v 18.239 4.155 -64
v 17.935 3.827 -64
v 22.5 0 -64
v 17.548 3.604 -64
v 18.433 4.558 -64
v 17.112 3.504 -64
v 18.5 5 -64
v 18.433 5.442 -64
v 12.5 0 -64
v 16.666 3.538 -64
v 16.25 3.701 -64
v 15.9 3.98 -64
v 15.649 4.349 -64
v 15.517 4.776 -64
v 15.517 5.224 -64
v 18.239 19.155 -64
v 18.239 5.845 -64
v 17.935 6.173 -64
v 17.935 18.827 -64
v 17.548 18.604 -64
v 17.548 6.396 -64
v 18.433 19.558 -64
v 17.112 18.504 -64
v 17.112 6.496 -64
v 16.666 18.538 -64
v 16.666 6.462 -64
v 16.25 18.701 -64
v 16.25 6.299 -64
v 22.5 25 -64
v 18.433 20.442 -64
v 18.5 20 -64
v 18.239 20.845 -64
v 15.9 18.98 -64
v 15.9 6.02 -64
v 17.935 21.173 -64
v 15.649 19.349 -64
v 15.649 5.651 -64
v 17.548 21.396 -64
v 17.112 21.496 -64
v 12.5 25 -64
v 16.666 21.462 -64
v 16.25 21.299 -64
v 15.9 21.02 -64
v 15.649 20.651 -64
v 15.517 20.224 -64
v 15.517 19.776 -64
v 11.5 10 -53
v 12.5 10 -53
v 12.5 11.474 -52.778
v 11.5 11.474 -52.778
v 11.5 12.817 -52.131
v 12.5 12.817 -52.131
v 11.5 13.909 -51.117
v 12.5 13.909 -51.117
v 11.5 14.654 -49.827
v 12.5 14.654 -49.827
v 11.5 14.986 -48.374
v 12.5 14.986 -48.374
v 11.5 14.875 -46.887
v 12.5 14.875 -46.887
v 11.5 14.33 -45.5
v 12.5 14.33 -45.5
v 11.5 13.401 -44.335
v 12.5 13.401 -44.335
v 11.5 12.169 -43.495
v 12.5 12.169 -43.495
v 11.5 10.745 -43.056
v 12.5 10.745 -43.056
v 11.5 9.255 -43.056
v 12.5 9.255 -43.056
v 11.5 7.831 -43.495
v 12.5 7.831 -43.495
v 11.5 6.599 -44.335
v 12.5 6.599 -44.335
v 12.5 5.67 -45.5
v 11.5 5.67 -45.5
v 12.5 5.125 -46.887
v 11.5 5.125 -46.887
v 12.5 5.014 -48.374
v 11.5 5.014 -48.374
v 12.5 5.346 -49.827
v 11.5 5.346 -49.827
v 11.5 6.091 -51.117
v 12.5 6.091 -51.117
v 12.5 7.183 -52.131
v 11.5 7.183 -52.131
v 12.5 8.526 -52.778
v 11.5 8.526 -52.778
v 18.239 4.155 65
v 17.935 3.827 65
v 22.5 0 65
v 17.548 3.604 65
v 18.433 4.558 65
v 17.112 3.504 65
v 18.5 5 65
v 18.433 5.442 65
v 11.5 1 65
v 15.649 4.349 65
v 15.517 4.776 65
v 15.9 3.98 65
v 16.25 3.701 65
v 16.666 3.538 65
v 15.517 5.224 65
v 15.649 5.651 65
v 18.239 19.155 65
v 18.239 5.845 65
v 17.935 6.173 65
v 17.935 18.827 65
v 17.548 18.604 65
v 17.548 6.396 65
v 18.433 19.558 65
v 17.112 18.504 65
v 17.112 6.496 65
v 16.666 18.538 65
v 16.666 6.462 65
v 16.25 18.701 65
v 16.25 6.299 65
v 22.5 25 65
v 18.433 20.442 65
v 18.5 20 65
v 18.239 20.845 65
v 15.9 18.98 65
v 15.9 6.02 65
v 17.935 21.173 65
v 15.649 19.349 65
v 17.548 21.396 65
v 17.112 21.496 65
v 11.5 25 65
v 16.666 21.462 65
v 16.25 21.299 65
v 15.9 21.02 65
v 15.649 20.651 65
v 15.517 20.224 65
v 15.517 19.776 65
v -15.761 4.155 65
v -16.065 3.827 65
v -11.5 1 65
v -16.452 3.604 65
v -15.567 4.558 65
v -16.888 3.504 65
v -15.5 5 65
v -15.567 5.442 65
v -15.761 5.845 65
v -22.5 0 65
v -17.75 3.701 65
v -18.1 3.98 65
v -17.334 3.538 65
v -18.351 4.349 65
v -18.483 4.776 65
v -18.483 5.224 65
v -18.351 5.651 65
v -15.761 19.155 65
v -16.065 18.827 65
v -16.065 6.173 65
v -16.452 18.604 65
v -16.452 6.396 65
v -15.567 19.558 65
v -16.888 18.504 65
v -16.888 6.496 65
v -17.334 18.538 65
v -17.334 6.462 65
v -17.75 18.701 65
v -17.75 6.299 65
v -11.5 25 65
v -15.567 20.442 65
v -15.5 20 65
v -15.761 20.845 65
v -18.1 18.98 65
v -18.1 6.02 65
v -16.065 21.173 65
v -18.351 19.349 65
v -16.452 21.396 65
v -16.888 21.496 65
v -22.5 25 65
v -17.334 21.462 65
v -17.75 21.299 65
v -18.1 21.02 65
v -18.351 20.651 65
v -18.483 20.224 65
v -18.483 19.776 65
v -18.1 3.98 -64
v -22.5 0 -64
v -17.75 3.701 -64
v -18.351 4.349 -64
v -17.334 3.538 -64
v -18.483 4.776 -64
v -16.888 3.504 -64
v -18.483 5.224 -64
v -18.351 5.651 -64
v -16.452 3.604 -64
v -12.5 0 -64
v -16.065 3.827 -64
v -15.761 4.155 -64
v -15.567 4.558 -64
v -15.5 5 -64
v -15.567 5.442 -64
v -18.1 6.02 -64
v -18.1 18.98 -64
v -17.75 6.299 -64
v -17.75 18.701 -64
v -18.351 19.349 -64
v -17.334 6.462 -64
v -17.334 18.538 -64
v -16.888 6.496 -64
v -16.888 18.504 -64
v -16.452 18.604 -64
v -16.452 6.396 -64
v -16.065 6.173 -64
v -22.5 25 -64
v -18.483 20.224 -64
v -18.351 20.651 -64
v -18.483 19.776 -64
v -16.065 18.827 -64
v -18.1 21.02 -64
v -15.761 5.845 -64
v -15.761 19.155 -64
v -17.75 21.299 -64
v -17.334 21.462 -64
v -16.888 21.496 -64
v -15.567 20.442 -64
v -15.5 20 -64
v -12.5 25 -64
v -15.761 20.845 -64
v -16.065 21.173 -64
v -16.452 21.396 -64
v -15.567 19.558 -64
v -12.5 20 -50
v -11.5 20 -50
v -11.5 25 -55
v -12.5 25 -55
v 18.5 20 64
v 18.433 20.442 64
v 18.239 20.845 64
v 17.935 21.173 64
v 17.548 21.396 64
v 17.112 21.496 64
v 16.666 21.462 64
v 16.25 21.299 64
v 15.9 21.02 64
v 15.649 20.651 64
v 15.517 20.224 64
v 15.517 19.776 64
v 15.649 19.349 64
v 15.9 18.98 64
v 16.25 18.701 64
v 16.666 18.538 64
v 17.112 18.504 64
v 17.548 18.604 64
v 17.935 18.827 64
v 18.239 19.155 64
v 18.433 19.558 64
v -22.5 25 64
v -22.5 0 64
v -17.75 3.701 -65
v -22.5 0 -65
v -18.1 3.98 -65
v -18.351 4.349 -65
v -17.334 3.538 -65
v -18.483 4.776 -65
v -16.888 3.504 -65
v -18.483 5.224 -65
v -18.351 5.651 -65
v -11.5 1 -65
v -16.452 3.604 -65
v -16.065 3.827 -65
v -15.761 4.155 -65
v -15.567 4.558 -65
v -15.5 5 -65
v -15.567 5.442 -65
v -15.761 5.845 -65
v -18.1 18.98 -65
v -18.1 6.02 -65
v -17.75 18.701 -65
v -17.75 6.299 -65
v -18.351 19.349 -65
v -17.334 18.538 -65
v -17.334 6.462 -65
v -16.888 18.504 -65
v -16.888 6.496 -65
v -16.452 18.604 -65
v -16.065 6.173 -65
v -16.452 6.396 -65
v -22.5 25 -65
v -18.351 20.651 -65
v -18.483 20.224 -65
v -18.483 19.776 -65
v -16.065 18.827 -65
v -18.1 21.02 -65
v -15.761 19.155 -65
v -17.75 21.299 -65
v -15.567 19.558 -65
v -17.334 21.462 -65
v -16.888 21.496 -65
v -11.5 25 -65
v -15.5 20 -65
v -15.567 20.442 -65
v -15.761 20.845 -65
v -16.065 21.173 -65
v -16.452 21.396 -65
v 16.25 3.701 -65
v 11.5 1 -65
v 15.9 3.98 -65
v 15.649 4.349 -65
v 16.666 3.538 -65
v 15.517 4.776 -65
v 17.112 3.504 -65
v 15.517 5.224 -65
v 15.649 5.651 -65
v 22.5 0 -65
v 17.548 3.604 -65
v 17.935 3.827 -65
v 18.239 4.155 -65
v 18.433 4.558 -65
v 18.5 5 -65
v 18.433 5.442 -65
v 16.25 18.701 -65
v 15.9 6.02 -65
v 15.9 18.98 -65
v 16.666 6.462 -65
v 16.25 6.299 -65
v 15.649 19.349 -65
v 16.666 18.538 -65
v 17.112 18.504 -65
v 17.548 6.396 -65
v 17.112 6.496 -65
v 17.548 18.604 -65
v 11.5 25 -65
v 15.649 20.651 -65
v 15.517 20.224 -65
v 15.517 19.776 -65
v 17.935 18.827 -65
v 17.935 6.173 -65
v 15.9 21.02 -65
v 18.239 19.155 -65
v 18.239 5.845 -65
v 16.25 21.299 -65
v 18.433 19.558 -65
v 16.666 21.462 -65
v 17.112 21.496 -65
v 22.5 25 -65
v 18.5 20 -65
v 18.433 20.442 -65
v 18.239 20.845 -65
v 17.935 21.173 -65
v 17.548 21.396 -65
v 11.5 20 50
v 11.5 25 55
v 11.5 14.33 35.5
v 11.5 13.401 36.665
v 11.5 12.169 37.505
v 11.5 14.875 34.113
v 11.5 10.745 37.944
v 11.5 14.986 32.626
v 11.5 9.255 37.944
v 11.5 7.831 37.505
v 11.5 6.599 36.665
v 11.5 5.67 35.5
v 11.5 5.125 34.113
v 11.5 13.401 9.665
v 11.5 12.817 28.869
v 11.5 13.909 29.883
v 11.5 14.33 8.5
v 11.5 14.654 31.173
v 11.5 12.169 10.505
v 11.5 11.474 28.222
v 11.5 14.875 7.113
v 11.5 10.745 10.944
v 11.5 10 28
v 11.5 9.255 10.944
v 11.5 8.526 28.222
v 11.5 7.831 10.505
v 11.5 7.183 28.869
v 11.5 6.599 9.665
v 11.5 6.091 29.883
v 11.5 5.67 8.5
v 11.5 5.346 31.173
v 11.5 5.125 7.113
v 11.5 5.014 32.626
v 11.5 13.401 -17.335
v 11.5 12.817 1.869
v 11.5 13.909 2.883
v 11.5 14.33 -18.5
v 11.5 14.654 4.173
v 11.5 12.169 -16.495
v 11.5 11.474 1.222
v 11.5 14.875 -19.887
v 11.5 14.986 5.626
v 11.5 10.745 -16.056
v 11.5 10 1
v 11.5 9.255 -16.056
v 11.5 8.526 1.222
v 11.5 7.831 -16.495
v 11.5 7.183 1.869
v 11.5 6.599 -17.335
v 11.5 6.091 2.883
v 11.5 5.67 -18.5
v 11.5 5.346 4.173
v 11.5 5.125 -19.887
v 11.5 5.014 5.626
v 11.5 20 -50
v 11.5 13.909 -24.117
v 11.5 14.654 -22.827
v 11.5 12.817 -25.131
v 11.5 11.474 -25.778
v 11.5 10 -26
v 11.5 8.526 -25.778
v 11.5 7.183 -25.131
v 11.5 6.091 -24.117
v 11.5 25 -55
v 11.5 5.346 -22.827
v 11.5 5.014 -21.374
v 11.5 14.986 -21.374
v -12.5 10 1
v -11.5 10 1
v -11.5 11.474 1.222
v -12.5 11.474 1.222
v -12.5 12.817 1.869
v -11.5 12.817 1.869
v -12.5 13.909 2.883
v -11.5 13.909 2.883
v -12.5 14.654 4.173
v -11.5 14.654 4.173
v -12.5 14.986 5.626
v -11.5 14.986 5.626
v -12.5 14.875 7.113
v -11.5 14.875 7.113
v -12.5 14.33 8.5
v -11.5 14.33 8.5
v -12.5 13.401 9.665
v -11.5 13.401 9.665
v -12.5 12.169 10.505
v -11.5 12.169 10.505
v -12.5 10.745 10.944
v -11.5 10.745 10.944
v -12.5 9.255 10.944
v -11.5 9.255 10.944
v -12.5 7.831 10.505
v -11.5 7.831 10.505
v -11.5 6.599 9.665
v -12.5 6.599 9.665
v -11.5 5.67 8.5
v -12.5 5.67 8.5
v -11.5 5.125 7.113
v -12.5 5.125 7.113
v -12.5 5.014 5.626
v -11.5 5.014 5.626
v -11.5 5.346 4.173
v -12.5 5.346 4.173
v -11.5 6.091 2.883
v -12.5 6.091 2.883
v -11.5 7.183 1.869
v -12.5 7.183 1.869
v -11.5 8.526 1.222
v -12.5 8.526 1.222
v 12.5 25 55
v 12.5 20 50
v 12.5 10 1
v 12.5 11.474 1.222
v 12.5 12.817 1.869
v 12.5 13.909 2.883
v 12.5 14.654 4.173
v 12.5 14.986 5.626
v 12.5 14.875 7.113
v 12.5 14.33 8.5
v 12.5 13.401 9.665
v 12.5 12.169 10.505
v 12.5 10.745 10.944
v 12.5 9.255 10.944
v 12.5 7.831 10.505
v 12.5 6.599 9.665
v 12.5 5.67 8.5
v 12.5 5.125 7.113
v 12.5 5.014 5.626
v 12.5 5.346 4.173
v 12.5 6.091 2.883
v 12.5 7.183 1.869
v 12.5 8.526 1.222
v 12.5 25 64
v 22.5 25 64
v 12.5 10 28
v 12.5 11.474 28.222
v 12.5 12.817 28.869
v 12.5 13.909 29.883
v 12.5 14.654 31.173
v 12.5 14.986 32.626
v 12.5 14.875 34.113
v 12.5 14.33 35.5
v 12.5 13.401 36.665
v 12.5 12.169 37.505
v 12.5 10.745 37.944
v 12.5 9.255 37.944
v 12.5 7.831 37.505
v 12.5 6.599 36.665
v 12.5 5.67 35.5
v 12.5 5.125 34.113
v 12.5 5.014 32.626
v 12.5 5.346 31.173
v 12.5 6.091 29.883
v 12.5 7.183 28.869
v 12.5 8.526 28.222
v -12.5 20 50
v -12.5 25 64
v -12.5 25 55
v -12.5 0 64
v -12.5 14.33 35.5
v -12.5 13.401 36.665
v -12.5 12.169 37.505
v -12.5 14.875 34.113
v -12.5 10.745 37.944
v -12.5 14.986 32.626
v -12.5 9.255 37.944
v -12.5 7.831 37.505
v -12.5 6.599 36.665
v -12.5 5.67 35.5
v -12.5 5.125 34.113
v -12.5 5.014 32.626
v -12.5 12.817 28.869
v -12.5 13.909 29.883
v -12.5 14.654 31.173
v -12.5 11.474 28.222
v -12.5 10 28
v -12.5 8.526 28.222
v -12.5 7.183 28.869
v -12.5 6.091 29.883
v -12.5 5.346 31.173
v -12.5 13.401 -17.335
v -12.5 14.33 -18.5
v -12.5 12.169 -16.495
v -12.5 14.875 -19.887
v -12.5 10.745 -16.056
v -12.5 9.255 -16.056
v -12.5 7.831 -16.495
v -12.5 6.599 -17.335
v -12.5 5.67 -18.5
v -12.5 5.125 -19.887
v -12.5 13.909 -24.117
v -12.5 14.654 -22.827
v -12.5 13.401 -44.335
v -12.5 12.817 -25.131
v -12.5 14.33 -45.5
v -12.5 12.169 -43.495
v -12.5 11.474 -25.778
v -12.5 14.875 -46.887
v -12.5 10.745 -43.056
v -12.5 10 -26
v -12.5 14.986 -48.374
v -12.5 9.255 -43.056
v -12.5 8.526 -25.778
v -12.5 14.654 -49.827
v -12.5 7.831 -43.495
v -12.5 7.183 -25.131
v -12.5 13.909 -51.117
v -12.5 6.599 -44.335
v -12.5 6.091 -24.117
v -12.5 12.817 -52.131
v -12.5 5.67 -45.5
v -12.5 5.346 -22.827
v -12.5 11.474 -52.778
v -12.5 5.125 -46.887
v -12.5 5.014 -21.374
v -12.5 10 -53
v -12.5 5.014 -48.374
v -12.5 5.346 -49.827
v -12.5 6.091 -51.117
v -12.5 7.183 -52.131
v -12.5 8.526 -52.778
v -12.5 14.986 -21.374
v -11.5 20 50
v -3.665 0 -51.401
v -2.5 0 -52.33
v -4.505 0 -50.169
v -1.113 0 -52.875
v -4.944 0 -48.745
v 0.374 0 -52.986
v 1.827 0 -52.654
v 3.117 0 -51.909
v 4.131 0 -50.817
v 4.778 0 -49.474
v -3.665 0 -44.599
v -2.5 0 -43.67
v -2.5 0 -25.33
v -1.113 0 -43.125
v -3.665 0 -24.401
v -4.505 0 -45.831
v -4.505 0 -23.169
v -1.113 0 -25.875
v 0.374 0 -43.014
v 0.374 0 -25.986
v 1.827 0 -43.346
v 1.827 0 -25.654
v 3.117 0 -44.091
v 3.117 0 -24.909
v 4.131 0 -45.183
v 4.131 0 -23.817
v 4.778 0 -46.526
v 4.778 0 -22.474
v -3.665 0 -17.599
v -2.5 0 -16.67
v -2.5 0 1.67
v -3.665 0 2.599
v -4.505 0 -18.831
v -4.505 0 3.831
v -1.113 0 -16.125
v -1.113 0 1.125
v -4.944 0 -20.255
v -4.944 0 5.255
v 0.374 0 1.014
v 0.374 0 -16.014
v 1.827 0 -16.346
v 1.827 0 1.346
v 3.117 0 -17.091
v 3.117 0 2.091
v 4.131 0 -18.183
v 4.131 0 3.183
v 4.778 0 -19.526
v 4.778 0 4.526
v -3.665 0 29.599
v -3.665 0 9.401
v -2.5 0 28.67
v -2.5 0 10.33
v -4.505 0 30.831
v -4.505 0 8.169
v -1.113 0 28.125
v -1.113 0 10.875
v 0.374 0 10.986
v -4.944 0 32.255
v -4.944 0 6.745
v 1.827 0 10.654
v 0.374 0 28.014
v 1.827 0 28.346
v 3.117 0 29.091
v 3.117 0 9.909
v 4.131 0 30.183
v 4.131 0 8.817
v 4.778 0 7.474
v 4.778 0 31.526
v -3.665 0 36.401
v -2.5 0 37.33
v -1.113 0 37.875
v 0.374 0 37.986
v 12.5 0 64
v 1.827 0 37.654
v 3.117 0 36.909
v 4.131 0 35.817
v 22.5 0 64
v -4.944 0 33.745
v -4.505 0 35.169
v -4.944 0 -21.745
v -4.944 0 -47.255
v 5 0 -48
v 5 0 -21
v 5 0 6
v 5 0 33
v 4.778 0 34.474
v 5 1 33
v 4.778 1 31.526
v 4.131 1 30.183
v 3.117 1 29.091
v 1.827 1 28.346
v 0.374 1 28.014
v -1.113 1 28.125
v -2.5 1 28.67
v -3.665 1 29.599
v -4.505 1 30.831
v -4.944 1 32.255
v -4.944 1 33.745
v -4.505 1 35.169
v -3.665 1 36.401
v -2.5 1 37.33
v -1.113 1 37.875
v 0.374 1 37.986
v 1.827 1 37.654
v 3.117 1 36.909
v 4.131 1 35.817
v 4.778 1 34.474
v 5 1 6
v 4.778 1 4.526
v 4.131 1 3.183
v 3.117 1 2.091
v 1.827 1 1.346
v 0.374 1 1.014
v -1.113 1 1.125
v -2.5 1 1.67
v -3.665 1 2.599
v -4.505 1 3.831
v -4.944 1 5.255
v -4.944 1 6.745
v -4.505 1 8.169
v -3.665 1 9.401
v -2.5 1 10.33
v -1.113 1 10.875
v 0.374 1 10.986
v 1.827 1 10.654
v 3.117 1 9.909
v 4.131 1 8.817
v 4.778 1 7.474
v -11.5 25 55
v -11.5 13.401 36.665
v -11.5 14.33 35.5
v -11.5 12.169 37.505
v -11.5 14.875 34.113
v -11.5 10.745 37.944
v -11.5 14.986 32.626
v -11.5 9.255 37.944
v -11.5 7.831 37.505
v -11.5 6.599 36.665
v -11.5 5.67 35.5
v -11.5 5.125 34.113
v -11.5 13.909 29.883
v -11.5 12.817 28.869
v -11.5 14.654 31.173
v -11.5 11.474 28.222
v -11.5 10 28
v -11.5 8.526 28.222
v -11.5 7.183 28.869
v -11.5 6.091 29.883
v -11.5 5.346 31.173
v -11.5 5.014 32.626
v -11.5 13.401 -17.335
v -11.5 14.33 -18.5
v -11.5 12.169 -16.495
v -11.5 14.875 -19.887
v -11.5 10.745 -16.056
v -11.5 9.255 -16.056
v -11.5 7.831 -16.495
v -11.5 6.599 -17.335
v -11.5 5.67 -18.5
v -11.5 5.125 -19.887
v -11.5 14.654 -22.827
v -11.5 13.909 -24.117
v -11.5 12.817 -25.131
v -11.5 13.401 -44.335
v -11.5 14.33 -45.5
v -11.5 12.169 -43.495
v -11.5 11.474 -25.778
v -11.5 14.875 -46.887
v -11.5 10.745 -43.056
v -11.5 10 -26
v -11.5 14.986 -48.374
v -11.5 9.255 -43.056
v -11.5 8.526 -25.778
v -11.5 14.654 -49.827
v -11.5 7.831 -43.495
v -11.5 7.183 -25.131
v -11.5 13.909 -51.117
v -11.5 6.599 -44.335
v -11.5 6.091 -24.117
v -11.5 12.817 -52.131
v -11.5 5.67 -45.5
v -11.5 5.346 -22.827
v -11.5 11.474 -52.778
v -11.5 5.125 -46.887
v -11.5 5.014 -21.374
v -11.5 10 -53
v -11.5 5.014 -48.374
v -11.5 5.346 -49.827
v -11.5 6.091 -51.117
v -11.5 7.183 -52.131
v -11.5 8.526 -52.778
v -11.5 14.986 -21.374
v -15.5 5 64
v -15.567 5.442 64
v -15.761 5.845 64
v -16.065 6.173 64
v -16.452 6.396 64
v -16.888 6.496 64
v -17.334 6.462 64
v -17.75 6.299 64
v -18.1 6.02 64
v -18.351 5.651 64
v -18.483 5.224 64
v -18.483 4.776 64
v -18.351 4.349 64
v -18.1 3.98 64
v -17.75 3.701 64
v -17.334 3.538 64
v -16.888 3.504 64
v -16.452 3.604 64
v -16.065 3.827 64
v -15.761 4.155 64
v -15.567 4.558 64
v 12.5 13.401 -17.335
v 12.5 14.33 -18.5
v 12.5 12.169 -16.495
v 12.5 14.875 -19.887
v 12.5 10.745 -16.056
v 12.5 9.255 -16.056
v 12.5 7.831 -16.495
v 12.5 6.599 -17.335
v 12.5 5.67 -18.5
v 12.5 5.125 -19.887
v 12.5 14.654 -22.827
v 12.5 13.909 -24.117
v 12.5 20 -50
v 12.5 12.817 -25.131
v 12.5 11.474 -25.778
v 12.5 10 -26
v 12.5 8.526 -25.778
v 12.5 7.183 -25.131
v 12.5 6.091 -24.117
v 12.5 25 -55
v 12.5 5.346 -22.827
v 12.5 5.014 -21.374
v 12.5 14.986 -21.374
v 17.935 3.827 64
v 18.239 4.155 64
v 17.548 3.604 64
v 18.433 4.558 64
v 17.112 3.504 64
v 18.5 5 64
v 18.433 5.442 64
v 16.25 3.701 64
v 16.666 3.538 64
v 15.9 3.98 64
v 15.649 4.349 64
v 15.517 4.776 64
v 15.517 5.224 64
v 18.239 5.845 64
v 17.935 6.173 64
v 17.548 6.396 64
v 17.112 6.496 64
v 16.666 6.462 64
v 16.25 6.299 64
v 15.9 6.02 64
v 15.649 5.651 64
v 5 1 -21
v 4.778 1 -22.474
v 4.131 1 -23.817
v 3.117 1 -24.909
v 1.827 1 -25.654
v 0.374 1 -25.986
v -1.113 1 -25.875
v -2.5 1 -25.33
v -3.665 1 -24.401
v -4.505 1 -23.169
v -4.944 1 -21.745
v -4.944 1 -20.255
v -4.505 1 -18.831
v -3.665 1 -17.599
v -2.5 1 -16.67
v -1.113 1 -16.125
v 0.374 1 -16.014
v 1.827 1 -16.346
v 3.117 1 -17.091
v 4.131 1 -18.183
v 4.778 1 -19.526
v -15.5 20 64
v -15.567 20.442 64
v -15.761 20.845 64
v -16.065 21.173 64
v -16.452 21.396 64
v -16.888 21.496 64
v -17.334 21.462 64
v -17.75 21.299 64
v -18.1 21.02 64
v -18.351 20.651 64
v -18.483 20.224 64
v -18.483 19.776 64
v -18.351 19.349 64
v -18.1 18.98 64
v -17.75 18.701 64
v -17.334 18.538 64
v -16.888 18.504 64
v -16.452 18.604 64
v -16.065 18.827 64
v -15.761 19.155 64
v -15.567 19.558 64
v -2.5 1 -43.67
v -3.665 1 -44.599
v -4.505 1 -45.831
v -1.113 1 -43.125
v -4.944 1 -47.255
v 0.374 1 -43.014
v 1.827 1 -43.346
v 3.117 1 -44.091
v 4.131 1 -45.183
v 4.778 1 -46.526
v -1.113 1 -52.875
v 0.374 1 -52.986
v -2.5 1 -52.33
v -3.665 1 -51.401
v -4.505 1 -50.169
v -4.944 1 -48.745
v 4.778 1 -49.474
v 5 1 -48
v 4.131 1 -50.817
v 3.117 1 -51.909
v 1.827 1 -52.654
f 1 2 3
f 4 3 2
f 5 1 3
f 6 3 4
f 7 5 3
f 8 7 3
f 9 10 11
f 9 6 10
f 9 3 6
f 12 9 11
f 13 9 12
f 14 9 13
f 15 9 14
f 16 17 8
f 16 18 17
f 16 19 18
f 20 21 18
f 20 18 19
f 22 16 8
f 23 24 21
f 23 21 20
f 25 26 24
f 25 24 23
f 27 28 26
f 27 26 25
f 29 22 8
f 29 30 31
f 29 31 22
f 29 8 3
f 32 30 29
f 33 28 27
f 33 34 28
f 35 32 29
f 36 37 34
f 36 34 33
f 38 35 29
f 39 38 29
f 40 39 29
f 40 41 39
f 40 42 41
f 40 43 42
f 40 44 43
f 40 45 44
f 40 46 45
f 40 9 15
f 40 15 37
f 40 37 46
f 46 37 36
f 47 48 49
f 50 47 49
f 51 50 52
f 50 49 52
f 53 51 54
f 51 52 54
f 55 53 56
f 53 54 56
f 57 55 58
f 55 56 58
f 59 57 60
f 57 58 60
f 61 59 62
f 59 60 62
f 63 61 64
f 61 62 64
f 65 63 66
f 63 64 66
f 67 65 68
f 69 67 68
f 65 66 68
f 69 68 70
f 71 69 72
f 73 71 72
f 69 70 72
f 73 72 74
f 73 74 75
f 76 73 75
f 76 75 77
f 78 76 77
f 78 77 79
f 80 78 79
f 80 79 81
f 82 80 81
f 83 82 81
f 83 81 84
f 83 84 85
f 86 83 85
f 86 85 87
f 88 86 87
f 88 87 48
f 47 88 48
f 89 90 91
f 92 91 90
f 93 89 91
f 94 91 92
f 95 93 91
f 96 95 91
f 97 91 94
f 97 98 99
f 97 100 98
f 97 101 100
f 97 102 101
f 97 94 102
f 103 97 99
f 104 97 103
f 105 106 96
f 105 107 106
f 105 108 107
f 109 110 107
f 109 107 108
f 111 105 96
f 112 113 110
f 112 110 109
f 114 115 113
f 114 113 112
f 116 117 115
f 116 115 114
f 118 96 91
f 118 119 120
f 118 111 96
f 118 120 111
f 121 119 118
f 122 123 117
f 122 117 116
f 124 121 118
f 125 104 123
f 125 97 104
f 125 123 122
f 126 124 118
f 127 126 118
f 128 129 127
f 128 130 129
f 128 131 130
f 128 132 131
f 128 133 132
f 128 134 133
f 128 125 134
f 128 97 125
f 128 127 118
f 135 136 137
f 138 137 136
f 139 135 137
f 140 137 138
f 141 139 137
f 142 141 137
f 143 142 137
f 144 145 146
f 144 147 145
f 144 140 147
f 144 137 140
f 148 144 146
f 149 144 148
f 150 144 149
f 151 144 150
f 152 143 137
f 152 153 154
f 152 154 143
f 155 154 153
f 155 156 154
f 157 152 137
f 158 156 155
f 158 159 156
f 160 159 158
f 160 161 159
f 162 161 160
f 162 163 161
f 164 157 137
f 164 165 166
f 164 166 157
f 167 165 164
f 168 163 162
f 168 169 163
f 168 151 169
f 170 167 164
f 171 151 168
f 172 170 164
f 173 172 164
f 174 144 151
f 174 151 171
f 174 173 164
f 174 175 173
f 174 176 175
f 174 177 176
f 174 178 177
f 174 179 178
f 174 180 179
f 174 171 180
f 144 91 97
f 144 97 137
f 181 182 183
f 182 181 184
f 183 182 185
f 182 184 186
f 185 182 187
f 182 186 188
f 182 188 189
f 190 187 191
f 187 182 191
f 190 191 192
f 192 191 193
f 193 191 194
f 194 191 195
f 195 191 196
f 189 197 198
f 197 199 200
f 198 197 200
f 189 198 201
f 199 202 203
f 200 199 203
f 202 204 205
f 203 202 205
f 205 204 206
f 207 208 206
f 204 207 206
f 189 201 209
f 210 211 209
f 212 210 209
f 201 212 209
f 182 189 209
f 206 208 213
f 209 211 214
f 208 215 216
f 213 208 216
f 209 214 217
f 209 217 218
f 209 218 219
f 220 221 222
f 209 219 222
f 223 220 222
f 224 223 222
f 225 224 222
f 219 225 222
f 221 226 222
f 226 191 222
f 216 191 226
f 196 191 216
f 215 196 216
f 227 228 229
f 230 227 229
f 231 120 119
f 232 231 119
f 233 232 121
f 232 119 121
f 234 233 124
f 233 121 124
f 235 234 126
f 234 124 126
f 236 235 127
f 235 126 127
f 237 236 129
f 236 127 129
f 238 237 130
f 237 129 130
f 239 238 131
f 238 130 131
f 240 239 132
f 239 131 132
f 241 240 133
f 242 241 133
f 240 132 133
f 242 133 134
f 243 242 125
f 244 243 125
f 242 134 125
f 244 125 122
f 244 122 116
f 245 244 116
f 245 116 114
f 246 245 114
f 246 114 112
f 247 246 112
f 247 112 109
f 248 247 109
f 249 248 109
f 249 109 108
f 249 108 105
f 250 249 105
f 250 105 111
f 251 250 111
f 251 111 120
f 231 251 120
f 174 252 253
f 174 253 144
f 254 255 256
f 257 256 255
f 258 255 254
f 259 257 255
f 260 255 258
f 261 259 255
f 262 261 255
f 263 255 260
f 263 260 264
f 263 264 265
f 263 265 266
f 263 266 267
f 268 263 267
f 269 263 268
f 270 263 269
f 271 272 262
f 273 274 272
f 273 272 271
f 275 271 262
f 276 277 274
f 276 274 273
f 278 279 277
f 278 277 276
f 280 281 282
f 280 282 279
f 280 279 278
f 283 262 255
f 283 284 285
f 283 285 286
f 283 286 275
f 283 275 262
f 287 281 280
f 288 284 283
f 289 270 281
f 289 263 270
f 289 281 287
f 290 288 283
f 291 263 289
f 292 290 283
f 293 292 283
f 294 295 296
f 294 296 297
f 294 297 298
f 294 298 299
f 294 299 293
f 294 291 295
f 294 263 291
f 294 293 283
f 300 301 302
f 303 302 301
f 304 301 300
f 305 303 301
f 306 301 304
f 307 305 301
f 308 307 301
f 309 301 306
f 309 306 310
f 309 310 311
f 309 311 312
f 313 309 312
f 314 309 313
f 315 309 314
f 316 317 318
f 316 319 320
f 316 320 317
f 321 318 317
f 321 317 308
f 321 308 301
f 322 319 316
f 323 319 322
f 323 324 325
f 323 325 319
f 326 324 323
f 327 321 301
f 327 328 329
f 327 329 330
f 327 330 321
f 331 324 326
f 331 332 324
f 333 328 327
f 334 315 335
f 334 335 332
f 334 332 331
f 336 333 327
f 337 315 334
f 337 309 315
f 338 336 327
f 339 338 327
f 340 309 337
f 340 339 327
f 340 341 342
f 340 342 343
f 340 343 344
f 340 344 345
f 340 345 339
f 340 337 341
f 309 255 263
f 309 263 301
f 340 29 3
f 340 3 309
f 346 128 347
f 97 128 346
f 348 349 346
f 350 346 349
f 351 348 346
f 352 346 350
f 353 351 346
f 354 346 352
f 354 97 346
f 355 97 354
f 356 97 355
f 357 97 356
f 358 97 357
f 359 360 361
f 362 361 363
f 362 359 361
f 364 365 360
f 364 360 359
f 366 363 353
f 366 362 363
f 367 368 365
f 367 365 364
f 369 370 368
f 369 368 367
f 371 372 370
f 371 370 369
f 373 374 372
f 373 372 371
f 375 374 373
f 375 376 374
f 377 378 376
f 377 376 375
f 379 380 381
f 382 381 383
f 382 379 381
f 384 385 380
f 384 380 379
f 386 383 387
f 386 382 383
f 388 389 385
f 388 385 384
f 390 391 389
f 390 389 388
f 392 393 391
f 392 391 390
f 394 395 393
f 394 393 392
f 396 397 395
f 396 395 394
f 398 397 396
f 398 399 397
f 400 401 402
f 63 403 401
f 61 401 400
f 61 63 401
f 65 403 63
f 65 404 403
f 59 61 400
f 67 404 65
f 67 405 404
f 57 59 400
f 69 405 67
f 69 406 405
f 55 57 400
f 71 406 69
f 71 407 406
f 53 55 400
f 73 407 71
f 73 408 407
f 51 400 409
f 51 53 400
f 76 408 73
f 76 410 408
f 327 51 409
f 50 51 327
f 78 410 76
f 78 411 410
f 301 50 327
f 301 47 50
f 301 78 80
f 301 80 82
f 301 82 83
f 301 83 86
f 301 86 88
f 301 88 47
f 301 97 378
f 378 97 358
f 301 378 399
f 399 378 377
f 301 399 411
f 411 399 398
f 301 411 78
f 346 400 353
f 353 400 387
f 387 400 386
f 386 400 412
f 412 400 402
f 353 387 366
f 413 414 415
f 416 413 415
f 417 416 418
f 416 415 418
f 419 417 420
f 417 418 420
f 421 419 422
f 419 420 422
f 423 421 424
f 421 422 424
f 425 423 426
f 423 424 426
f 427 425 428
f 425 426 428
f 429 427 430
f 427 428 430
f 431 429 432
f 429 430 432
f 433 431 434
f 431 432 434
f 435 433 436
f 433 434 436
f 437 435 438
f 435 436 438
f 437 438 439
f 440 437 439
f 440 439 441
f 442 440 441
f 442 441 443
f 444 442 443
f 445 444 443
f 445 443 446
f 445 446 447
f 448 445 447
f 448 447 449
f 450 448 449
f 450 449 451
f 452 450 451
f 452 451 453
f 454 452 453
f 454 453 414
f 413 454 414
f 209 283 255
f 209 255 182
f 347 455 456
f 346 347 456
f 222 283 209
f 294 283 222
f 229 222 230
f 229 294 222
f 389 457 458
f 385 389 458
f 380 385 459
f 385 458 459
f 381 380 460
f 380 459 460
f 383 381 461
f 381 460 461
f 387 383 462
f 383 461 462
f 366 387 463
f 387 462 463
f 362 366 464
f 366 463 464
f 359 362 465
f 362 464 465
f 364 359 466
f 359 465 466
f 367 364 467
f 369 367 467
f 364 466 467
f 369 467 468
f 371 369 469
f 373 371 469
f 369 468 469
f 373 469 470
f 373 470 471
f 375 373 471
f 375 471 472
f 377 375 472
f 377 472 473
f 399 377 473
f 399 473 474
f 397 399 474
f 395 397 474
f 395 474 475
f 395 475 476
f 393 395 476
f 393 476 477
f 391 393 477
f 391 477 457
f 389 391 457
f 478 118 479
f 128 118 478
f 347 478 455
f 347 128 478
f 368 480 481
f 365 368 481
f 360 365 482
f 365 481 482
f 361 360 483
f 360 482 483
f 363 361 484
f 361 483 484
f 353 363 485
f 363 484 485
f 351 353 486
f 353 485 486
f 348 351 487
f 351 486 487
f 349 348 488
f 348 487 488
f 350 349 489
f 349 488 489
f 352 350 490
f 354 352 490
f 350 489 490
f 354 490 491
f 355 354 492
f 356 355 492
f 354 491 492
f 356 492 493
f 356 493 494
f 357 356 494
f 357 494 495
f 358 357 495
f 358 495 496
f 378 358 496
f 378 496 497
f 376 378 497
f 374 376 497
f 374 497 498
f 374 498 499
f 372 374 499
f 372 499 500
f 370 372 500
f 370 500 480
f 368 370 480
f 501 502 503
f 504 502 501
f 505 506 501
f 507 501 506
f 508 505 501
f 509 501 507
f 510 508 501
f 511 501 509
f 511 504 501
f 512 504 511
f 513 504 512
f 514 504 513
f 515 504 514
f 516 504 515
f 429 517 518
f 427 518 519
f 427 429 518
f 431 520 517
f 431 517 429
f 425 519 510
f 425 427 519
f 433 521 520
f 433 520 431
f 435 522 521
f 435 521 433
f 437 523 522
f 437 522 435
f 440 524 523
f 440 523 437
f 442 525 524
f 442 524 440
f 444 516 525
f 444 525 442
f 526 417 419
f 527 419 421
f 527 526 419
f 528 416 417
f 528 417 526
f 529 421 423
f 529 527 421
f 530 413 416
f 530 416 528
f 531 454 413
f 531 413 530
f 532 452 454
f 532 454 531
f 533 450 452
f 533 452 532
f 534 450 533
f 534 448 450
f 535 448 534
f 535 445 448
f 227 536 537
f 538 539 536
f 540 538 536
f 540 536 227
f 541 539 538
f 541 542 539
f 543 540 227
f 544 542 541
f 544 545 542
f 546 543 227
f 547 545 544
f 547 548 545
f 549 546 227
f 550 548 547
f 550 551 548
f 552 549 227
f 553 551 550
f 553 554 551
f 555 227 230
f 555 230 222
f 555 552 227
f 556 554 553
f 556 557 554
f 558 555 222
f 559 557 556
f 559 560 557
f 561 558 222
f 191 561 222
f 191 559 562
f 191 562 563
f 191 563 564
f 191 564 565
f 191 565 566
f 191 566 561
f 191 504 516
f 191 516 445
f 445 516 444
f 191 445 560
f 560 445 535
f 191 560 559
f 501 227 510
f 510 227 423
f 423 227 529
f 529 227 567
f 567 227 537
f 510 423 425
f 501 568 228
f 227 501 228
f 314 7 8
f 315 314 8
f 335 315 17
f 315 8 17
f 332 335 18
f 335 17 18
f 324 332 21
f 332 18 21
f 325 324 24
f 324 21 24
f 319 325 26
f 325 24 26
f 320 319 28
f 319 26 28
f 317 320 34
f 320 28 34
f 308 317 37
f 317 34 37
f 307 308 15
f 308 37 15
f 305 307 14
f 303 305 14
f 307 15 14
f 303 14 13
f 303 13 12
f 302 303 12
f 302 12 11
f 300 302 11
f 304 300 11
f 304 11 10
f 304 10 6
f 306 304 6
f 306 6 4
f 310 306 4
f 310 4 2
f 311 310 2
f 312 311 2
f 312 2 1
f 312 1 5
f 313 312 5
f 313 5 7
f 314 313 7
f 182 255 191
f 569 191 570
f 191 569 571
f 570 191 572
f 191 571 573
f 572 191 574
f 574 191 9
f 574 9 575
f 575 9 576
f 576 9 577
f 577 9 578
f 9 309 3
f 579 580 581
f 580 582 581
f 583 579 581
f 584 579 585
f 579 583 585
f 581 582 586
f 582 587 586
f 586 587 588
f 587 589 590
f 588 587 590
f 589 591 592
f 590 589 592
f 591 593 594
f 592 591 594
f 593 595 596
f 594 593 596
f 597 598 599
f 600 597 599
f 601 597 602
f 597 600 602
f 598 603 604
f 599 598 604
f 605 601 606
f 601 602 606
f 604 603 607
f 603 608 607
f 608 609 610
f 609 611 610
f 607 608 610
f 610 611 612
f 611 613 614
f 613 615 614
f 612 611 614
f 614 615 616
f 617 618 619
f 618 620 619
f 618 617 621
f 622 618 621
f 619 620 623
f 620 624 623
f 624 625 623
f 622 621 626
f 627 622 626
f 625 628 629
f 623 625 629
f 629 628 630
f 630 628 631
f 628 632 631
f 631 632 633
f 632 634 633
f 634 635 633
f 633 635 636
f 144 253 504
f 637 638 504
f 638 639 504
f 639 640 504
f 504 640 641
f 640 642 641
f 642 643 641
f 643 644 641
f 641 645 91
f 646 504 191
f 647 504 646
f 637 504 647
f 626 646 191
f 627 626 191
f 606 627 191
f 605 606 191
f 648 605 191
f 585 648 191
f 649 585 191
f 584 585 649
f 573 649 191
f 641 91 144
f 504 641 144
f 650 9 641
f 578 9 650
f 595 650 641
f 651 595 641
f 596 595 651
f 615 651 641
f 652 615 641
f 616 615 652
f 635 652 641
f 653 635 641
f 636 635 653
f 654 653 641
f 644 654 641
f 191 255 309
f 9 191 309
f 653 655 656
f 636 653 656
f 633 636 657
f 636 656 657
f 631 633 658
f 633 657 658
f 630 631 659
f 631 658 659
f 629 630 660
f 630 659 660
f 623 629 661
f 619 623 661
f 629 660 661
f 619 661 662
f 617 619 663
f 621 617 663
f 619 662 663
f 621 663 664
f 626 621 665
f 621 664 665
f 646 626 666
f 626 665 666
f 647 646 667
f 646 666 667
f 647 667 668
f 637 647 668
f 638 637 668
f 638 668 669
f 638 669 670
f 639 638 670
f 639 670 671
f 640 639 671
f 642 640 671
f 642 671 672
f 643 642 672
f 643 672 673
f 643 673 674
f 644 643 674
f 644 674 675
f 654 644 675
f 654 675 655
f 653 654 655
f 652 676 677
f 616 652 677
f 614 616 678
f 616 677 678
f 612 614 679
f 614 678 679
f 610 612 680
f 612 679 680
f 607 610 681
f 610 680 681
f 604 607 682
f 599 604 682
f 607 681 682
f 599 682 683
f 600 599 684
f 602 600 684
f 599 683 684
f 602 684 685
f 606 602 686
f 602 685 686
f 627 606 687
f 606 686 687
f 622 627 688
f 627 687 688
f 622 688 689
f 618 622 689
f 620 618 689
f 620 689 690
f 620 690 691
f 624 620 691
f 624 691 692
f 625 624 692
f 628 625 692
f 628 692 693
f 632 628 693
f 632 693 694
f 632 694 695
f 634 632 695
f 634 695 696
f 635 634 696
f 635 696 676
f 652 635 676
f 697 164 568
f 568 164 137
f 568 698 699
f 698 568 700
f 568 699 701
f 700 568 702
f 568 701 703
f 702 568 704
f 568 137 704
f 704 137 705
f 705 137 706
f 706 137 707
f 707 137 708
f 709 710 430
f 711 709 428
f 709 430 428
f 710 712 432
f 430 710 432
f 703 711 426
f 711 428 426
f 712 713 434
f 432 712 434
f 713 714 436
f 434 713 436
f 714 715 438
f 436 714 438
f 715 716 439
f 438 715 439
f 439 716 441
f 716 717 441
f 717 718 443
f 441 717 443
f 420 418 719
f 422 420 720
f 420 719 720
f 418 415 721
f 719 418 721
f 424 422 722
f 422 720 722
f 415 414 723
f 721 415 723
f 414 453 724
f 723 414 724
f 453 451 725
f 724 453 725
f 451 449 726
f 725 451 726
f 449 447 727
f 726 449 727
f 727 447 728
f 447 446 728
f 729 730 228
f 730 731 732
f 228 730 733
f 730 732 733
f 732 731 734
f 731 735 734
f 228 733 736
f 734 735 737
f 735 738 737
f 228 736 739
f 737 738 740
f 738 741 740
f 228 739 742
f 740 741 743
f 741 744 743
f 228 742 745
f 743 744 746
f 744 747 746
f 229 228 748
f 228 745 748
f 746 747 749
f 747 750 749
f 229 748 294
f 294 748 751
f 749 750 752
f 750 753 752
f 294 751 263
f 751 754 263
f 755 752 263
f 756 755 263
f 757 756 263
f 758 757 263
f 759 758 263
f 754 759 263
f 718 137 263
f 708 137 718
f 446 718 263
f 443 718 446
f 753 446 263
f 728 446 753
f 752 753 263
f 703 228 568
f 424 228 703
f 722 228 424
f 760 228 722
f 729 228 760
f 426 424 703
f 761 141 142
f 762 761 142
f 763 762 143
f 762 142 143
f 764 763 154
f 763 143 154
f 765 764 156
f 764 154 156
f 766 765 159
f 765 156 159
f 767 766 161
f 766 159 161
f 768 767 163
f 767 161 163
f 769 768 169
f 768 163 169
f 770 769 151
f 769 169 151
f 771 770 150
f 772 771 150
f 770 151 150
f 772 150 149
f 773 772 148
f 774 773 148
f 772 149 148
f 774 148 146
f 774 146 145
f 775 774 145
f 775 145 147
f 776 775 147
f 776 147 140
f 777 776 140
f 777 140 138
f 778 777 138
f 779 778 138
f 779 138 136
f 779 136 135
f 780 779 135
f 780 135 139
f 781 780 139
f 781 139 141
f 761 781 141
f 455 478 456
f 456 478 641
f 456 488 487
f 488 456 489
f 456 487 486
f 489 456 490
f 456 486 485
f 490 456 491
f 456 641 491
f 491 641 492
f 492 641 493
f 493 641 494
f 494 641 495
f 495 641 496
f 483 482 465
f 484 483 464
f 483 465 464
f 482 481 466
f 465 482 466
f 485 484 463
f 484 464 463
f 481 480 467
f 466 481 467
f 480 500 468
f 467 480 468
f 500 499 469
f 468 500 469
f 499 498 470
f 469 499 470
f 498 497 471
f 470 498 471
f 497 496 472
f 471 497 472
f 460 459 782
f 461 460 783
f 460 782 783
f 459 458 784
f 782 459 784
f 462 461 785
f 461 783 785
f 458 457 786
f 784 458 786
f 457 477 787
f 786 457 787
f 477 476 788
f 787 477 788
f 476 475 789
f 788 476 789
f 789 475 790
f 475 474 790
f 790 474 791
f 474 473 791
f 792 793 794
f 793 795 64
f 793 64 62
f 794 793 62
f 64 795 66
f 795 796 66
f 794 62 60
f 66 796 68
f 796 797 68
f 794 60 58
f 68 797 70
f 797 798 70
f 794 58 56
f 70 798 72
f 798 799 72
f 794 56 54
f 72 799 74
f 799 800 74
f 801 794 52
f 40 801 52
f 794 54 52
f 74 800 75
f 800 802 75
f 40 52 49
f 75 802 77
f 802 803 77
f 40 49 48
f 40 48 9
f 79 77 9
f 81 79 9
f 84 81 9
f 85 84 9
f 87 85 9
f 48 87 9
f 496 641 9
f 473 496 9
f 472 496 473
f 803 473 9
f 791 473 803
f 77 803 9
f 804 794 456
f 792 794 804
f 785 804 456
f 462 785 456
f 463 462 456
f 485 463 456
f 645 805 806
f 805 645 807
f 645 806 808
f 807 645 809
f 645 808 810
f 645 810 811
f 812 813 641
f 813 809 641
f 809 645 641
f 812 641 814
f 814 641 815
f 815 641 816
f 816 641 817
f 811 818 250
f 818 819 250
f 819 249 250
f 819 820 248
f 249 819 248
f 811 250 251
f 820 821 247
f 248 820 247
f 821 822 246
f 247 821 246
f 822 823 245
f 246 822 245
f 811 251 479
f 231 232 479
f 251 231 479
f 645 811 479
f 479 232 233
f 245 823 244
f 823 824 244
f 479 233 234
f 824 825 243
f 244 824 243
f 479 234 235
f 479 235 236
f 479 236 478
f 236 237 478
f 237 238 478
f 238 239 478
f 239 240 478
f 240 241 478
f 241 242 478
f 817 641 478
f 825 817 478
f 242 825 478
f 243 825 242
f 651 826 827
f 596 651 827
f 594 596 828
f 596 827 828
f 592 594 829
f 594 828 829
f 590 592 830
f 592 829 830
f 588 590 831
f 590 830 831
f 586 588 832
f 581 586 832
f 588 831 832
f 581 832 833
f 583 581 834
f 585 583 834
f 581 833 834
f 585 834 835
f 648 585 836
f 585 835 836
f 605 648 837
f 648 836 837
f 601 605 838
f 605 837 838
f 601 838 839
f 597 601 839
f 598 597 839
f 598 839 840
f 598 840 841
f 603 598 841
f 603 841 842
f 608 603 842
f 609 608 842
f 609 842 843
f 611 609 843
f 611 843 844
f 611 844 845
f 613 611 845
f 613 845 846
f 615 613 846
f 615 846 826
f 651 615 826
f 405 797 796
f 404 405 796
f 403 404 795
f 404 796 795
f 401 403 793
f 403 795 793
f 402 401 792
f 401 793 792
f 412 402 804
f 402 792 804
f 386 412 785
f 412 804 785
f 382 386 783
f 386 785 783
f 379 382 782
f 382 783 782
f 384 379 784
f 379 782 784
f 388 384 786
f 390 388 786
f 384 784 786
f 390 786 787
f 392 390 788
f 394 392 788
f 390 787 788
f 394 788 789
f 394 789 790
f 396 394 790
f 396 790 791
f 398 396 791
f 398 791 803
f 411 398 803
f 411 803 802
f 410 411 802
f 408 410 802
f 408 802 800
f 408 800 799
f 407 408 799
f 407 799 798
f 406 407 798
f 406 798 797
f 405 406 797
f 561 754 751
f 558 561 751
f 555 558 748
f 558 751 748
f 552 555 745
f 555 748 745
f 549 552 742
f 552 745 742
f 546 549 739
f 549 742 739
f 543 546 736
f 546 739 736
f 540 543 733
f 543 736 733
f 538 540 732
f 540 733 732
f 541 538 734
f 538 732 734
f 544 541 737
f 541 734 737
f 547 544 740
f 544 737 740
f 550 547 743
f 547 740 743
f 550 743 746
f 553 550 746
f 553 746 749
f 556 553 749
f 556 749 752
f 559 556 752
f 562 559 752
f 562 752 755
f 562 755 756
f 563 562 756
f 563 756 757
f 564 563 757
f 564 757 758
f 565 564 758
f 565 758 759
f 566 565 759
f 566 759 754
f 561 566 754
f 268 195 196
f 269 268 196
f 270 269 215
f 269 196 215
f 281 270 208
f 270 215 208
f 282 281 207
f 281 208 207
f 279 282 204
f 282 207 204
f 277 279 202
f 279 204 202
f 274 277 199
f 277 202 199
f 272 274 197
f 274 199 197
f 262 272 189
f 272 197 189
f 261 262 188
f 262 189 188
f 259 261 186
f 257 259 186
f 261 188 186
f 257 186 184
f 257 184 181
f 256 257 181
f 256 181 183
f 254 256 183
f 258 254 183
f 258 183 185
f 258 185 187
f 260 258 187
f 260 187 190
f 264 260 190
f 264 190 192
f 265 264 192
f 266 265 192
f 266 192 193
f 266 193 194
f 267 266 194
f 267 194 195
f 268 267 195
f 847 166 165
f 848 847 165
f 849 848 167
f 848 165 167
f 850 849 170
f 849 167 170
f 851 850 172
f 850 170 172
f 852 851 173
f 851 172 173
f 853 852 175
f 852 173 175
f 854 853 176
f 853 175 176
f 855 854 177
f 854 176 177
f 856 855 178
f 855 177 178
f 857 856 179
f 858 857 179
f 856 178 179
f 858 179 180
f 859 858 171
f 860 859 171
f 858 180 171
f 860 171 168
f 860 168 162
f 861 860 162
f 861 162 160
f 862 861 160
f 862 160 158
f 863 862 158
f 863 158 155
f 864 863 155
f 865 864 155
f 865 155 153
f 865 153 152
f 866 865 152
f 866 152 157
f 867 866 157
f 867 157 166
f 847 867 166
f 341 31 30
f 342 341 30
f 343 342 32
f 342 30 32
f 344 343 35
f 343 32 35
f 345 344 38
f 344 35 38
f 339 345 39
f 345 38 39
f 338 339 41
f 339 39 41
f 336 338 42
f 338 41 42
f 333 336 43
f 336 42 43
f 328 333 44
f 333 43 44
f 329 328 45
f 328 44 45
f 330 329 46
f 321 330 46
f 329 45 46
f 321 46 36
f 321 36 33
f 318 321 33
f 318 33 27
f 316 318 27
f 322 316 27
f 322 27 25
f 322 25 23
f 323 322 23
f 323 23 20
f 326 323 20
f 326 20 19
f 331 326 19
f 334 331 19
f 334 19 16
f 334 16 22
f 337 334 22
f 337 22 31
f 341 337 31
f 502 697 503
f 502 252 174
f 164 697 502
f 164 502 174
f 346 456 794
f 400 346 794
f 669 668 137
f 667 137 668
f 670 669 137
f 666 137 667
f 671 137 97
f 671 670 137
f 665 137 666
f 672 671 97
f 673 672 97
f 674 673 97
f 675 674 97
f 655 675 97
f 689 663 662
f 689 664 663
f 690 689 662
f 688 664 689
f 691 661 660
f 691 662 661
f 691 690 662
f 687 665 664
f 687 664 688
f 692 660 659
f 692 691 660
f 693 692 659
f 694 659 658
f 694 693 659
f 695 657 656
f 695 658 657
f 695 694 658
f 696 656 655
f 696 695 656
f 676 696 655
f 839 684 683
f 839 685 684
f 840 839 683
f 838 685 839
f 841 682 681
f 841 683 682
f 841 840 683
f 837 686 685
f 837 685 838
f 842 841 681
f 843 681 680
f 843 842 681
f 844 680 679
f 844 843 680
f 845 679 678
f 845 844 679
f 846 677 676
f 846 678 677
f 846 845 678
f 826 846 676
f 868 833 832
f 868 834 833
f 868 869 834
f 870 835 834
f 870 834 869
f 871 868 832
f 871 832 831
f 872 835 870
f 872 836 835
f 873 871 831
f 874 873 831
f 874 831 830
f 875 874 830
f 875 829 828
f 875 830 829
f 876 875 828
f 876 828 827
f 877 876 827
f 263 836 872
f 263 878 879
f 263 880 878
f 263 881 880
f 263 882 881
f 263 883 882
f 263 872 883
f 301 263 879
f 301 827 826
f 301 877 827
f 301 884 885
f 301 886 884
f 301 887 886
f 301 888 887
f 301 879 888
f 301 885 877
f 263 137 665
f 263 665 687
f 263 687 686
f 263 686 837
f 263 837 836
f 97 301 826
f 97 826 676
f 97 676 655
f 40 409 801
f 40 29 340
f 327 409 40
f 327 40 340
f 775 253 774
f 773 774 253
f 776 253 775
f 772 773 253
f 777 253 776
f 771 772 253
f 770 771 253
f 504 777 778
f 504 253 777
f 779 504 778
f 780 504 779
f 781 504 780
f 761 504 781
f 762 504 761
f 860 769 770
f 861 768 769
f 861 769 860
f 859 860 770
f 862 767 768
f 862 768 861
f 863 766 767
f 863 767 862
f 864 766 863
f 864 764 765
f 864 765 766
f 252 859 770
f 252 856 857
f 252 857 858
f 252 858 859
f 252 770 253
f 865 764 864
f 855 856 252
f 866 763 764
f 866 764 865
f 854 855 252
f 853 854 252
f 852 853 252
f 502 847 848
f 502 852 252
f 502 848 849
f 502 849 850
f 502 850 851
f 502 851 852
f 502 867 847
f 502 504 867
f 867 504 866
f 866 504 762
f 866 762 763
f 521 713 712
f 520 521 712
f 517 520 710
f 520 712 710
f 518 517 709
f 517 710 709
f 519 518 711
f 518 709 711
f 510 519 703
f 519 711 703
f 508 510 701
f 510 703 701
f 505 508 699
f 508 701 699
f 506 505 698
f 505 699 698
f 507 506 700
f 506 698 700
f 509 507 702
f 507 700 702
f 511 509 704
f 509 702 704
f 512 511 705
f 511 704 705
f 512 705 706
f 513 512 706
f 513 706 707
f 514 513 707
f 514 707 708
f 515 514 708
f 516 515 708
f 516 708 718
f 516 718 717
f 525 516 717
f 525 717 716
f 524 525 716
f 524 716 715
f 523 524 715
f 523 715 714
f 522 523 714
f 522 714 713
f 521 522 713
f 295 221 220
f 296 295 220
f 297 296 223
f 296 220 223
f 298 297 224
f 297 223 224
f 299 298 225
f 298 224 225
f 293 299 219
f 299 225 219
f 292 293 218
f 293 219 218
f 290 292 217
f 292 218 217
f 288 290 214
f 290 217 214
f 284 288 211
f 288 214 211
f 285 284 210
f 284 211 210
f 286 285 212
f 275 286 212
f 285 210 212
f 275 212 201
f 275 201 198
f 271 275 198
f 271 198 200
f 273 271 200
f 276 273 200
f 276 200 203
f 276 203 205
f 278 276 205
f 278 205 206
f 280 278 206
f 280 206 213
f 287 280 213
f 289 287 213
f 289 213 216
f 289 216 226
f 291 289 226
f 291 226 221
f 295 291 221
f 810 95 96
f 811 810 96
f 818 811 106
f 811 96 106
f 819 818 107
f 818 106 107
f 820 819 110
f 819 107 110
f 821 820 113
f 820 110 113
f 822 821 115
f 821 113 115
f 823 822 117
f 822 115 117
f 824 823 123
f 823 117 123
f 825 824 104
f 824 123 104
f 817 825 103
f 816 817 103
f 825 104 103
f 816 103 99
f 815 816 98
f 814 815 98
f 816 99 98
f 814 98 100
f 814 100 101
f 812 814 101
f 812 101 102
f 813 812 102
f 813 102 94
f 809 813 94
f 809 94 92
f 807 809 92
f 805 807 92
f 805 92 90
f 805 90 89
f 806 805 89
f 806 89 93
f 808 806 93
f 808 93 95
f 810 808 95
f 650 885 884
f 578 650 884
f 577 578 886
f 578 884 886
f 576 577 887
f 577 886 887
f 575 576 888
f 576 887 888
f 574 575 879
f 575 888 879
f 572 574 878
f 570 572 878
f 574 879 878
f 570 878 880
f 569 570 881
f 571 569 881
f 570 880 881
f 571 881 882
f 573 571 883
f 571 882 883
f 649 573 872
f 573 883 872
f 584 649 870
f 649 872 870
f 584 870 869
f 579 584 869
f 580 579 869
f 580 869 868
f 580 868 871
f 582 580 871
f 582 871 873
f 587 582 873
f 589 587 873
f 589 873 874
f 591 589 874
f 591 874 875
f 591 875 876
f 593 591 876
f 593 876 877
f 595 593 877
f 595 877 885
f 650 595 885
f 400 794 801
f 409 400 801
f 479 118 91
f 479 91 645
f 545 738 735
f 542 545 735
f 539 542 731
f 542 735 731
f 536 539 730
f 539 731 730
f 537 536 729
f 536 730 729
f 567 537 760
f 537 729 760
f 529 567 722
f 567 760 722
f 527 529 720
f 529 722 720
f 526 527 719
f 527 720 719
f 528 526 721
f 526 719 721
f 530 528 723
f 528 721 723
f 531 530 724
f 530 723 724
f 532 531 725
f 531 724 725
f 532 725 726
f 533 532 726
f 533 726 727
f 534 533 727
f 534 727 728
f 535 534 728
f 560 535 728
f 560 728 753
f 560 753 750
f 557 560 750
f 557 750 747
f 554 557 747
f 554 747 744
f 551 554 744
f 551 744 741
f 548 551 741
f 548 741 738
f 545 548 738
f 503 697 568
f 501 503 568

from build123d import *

# Parameters (mm, degrees)
SKETCH1_W               = 25
SKETCH1_H               = 130
BOSS_EXTRUDE1_DEPTH     = 1
SKETCH2_W               = 1
SKETCH2_H               = 130
BOSS_EXTRUDE2_DEPTH     = 24
SKETCH3_W               = 1
SKETCH3_H               = 25
BOSS_EXTRUDE3_DEPTH     = 10
SKETCH4_W               = 1
SKETCH4_H               = 25
BOSS_EXTRUDE4_DEPTH     = 10
SKETCH5_R               = 5
CUT_EXTRUDE1_DEPTH      = 2
SKETCH10_R              = 1.5
CUT_EXTRUDE3_DEPTH      = 131
CUT_EXTRUDE4_DEPTH      = 11
CUT_EXTRUDE4_DEPTH_BACK = 36
SKETCH9_R               = 5
CUT_EXTRUDE2_DEPTH      = 36


with BuildPart() as part:
    # Sketch1 → Boss-Extrude1 (new body)
    with BuildSketch(Plane(origin=(0, 0, 0), x_dir=(1, 0, 0), z_dir=(0, 1, 0))):
        Rectangle(SKETCH1_W, SKETCH1_H)
    extrude(amount=BOSS_EXTRUDE1_DEPTH)

    # Sketch2 → Boss-Extrude2 (add)
    with BuildSketch(Plane(origin=(0, 1, 0), x_dir=(1, 0, 0), z_dir=(0, 1, 0))):
        with Locations((12, 0)):
            Rectangle(SKETCH2_W, SKETCH2_H)
        with Locations((-12, 0)):
            Rectangle(SKETCH2_W, SKETCH2_H)
    extrude(amount=BOSS_EXTRUDE2_DEPTH)

    # Sketch3 → Boss-Extrude3 (add)
    with BuildSketch(Plane(origin=(12.5, 0, 0), x_dir=(0, 0, -1), z_dir=(1, 0, 0))):
        with Locations((-64.5, 12.5)):
            Rectangle(SKETCH3_W, SKETCH3_H)
        with Locations((64.5, 12.5)):
            Rectangle(SKETCH3_W, SKETCH3_H)
    extrude(amount=BOSS_EXTRUDE3_DEPTH)

    # Sketch4 → Boss-Extrude4 (add)
    with BuildSketch(Plane.ZY.offset(12.5)):
        with Locations((-64.5, 12.5)):
            Rectangle(SKETCH4_W, SKETCH4_H)
        with Locations((64.5, 12.5)):
            Rectangle(SKETCH4_W, SKETCH4_H)
    extrude(amount=BOSS_EXTRUDE4_DEPTH)

    # Sketch5 → Cut-Extrude1 (cut, through all)
    with BuildSketch(Plane(origin=(0, 1, 0), x_dir=(1, 0, 0), z_dir=(0, 1, 0))):
        with Locations((0, -33)):
            Circle(SKETCH5_R)
        with Locations((0, -6)):
            Circle(SKETCH5_R)
        with Locations((0, 21)):
            Circle(SKETCH5_R)
        with Locations((0, 48)):
            Circle(SKETCH5_R)
    extrude(amount=-CUT_EXTRUDE1_DEPTH, mode=Mode.SUBTRACT)

    # Sketch10 → Cut-Extrude3 (cut, through all)
    with BuildSketch(Plane.XY.offset(65)):
        with Locations((17, 20)):
            Circle(SKETCH10_R)
        with Locations((17, 5)):
            Circle(SKETCH10_R)
        with Locations((-17, 20)):
            Circle(SKETCH10_R)
        with Locations((-17, 5)):
            Circle(SKETCH10_R)
    extrude(amount=-CUT_EXTRUDE3_DEPTH, mode=Mode.SUBTRACT)

    # Sketch11 → Cut-Extrude4 (cut, two sides)
    with BuildSketch(Plane(origin=(12.5, 0, 0), x_dir=(0, 0, -1), z_dir=(1, 0, 0))) as cut_extrude4_sk:
        Polygon((0, 25), (-55, 25), (-50, 20), (0, 20), align=None)
        Polygon((55, 25), (0, 25), (0, 20), (50, 20), align=None)
    extrude(amount=CUT_EXTRUDE4_DEPTH, mode=Mode.SUBTRACT)
    extrude(cut_extrude4_sk.sketch, amount=-CUT_EXTRUDE4_DEPTH_BACK, mode=Mode.SUBTRACT)

    # Sketch9 → Cut-Extrude2 (cut, through all)
    with BuildSketch(Plane(origin=(12.5, 0, 0), x_dir=(0, 0, -1), z_dir=(1, 0, 0))):
        with Locations((-33, 10)):
            Circle(SKETCH9_R)
        with Locations((-6, 10)):
            Circle(SKETCH9_R)
        with Locations((21, 10)):
            Circle(SKETCH9_R)
        with Locations((48, 10)):
            Circle(SKETCH9_R)
    extrude(amount=-CUT_EXTRUDE2_DEPTH, mode=Mode.SUBTRACT)


solid = part.part
